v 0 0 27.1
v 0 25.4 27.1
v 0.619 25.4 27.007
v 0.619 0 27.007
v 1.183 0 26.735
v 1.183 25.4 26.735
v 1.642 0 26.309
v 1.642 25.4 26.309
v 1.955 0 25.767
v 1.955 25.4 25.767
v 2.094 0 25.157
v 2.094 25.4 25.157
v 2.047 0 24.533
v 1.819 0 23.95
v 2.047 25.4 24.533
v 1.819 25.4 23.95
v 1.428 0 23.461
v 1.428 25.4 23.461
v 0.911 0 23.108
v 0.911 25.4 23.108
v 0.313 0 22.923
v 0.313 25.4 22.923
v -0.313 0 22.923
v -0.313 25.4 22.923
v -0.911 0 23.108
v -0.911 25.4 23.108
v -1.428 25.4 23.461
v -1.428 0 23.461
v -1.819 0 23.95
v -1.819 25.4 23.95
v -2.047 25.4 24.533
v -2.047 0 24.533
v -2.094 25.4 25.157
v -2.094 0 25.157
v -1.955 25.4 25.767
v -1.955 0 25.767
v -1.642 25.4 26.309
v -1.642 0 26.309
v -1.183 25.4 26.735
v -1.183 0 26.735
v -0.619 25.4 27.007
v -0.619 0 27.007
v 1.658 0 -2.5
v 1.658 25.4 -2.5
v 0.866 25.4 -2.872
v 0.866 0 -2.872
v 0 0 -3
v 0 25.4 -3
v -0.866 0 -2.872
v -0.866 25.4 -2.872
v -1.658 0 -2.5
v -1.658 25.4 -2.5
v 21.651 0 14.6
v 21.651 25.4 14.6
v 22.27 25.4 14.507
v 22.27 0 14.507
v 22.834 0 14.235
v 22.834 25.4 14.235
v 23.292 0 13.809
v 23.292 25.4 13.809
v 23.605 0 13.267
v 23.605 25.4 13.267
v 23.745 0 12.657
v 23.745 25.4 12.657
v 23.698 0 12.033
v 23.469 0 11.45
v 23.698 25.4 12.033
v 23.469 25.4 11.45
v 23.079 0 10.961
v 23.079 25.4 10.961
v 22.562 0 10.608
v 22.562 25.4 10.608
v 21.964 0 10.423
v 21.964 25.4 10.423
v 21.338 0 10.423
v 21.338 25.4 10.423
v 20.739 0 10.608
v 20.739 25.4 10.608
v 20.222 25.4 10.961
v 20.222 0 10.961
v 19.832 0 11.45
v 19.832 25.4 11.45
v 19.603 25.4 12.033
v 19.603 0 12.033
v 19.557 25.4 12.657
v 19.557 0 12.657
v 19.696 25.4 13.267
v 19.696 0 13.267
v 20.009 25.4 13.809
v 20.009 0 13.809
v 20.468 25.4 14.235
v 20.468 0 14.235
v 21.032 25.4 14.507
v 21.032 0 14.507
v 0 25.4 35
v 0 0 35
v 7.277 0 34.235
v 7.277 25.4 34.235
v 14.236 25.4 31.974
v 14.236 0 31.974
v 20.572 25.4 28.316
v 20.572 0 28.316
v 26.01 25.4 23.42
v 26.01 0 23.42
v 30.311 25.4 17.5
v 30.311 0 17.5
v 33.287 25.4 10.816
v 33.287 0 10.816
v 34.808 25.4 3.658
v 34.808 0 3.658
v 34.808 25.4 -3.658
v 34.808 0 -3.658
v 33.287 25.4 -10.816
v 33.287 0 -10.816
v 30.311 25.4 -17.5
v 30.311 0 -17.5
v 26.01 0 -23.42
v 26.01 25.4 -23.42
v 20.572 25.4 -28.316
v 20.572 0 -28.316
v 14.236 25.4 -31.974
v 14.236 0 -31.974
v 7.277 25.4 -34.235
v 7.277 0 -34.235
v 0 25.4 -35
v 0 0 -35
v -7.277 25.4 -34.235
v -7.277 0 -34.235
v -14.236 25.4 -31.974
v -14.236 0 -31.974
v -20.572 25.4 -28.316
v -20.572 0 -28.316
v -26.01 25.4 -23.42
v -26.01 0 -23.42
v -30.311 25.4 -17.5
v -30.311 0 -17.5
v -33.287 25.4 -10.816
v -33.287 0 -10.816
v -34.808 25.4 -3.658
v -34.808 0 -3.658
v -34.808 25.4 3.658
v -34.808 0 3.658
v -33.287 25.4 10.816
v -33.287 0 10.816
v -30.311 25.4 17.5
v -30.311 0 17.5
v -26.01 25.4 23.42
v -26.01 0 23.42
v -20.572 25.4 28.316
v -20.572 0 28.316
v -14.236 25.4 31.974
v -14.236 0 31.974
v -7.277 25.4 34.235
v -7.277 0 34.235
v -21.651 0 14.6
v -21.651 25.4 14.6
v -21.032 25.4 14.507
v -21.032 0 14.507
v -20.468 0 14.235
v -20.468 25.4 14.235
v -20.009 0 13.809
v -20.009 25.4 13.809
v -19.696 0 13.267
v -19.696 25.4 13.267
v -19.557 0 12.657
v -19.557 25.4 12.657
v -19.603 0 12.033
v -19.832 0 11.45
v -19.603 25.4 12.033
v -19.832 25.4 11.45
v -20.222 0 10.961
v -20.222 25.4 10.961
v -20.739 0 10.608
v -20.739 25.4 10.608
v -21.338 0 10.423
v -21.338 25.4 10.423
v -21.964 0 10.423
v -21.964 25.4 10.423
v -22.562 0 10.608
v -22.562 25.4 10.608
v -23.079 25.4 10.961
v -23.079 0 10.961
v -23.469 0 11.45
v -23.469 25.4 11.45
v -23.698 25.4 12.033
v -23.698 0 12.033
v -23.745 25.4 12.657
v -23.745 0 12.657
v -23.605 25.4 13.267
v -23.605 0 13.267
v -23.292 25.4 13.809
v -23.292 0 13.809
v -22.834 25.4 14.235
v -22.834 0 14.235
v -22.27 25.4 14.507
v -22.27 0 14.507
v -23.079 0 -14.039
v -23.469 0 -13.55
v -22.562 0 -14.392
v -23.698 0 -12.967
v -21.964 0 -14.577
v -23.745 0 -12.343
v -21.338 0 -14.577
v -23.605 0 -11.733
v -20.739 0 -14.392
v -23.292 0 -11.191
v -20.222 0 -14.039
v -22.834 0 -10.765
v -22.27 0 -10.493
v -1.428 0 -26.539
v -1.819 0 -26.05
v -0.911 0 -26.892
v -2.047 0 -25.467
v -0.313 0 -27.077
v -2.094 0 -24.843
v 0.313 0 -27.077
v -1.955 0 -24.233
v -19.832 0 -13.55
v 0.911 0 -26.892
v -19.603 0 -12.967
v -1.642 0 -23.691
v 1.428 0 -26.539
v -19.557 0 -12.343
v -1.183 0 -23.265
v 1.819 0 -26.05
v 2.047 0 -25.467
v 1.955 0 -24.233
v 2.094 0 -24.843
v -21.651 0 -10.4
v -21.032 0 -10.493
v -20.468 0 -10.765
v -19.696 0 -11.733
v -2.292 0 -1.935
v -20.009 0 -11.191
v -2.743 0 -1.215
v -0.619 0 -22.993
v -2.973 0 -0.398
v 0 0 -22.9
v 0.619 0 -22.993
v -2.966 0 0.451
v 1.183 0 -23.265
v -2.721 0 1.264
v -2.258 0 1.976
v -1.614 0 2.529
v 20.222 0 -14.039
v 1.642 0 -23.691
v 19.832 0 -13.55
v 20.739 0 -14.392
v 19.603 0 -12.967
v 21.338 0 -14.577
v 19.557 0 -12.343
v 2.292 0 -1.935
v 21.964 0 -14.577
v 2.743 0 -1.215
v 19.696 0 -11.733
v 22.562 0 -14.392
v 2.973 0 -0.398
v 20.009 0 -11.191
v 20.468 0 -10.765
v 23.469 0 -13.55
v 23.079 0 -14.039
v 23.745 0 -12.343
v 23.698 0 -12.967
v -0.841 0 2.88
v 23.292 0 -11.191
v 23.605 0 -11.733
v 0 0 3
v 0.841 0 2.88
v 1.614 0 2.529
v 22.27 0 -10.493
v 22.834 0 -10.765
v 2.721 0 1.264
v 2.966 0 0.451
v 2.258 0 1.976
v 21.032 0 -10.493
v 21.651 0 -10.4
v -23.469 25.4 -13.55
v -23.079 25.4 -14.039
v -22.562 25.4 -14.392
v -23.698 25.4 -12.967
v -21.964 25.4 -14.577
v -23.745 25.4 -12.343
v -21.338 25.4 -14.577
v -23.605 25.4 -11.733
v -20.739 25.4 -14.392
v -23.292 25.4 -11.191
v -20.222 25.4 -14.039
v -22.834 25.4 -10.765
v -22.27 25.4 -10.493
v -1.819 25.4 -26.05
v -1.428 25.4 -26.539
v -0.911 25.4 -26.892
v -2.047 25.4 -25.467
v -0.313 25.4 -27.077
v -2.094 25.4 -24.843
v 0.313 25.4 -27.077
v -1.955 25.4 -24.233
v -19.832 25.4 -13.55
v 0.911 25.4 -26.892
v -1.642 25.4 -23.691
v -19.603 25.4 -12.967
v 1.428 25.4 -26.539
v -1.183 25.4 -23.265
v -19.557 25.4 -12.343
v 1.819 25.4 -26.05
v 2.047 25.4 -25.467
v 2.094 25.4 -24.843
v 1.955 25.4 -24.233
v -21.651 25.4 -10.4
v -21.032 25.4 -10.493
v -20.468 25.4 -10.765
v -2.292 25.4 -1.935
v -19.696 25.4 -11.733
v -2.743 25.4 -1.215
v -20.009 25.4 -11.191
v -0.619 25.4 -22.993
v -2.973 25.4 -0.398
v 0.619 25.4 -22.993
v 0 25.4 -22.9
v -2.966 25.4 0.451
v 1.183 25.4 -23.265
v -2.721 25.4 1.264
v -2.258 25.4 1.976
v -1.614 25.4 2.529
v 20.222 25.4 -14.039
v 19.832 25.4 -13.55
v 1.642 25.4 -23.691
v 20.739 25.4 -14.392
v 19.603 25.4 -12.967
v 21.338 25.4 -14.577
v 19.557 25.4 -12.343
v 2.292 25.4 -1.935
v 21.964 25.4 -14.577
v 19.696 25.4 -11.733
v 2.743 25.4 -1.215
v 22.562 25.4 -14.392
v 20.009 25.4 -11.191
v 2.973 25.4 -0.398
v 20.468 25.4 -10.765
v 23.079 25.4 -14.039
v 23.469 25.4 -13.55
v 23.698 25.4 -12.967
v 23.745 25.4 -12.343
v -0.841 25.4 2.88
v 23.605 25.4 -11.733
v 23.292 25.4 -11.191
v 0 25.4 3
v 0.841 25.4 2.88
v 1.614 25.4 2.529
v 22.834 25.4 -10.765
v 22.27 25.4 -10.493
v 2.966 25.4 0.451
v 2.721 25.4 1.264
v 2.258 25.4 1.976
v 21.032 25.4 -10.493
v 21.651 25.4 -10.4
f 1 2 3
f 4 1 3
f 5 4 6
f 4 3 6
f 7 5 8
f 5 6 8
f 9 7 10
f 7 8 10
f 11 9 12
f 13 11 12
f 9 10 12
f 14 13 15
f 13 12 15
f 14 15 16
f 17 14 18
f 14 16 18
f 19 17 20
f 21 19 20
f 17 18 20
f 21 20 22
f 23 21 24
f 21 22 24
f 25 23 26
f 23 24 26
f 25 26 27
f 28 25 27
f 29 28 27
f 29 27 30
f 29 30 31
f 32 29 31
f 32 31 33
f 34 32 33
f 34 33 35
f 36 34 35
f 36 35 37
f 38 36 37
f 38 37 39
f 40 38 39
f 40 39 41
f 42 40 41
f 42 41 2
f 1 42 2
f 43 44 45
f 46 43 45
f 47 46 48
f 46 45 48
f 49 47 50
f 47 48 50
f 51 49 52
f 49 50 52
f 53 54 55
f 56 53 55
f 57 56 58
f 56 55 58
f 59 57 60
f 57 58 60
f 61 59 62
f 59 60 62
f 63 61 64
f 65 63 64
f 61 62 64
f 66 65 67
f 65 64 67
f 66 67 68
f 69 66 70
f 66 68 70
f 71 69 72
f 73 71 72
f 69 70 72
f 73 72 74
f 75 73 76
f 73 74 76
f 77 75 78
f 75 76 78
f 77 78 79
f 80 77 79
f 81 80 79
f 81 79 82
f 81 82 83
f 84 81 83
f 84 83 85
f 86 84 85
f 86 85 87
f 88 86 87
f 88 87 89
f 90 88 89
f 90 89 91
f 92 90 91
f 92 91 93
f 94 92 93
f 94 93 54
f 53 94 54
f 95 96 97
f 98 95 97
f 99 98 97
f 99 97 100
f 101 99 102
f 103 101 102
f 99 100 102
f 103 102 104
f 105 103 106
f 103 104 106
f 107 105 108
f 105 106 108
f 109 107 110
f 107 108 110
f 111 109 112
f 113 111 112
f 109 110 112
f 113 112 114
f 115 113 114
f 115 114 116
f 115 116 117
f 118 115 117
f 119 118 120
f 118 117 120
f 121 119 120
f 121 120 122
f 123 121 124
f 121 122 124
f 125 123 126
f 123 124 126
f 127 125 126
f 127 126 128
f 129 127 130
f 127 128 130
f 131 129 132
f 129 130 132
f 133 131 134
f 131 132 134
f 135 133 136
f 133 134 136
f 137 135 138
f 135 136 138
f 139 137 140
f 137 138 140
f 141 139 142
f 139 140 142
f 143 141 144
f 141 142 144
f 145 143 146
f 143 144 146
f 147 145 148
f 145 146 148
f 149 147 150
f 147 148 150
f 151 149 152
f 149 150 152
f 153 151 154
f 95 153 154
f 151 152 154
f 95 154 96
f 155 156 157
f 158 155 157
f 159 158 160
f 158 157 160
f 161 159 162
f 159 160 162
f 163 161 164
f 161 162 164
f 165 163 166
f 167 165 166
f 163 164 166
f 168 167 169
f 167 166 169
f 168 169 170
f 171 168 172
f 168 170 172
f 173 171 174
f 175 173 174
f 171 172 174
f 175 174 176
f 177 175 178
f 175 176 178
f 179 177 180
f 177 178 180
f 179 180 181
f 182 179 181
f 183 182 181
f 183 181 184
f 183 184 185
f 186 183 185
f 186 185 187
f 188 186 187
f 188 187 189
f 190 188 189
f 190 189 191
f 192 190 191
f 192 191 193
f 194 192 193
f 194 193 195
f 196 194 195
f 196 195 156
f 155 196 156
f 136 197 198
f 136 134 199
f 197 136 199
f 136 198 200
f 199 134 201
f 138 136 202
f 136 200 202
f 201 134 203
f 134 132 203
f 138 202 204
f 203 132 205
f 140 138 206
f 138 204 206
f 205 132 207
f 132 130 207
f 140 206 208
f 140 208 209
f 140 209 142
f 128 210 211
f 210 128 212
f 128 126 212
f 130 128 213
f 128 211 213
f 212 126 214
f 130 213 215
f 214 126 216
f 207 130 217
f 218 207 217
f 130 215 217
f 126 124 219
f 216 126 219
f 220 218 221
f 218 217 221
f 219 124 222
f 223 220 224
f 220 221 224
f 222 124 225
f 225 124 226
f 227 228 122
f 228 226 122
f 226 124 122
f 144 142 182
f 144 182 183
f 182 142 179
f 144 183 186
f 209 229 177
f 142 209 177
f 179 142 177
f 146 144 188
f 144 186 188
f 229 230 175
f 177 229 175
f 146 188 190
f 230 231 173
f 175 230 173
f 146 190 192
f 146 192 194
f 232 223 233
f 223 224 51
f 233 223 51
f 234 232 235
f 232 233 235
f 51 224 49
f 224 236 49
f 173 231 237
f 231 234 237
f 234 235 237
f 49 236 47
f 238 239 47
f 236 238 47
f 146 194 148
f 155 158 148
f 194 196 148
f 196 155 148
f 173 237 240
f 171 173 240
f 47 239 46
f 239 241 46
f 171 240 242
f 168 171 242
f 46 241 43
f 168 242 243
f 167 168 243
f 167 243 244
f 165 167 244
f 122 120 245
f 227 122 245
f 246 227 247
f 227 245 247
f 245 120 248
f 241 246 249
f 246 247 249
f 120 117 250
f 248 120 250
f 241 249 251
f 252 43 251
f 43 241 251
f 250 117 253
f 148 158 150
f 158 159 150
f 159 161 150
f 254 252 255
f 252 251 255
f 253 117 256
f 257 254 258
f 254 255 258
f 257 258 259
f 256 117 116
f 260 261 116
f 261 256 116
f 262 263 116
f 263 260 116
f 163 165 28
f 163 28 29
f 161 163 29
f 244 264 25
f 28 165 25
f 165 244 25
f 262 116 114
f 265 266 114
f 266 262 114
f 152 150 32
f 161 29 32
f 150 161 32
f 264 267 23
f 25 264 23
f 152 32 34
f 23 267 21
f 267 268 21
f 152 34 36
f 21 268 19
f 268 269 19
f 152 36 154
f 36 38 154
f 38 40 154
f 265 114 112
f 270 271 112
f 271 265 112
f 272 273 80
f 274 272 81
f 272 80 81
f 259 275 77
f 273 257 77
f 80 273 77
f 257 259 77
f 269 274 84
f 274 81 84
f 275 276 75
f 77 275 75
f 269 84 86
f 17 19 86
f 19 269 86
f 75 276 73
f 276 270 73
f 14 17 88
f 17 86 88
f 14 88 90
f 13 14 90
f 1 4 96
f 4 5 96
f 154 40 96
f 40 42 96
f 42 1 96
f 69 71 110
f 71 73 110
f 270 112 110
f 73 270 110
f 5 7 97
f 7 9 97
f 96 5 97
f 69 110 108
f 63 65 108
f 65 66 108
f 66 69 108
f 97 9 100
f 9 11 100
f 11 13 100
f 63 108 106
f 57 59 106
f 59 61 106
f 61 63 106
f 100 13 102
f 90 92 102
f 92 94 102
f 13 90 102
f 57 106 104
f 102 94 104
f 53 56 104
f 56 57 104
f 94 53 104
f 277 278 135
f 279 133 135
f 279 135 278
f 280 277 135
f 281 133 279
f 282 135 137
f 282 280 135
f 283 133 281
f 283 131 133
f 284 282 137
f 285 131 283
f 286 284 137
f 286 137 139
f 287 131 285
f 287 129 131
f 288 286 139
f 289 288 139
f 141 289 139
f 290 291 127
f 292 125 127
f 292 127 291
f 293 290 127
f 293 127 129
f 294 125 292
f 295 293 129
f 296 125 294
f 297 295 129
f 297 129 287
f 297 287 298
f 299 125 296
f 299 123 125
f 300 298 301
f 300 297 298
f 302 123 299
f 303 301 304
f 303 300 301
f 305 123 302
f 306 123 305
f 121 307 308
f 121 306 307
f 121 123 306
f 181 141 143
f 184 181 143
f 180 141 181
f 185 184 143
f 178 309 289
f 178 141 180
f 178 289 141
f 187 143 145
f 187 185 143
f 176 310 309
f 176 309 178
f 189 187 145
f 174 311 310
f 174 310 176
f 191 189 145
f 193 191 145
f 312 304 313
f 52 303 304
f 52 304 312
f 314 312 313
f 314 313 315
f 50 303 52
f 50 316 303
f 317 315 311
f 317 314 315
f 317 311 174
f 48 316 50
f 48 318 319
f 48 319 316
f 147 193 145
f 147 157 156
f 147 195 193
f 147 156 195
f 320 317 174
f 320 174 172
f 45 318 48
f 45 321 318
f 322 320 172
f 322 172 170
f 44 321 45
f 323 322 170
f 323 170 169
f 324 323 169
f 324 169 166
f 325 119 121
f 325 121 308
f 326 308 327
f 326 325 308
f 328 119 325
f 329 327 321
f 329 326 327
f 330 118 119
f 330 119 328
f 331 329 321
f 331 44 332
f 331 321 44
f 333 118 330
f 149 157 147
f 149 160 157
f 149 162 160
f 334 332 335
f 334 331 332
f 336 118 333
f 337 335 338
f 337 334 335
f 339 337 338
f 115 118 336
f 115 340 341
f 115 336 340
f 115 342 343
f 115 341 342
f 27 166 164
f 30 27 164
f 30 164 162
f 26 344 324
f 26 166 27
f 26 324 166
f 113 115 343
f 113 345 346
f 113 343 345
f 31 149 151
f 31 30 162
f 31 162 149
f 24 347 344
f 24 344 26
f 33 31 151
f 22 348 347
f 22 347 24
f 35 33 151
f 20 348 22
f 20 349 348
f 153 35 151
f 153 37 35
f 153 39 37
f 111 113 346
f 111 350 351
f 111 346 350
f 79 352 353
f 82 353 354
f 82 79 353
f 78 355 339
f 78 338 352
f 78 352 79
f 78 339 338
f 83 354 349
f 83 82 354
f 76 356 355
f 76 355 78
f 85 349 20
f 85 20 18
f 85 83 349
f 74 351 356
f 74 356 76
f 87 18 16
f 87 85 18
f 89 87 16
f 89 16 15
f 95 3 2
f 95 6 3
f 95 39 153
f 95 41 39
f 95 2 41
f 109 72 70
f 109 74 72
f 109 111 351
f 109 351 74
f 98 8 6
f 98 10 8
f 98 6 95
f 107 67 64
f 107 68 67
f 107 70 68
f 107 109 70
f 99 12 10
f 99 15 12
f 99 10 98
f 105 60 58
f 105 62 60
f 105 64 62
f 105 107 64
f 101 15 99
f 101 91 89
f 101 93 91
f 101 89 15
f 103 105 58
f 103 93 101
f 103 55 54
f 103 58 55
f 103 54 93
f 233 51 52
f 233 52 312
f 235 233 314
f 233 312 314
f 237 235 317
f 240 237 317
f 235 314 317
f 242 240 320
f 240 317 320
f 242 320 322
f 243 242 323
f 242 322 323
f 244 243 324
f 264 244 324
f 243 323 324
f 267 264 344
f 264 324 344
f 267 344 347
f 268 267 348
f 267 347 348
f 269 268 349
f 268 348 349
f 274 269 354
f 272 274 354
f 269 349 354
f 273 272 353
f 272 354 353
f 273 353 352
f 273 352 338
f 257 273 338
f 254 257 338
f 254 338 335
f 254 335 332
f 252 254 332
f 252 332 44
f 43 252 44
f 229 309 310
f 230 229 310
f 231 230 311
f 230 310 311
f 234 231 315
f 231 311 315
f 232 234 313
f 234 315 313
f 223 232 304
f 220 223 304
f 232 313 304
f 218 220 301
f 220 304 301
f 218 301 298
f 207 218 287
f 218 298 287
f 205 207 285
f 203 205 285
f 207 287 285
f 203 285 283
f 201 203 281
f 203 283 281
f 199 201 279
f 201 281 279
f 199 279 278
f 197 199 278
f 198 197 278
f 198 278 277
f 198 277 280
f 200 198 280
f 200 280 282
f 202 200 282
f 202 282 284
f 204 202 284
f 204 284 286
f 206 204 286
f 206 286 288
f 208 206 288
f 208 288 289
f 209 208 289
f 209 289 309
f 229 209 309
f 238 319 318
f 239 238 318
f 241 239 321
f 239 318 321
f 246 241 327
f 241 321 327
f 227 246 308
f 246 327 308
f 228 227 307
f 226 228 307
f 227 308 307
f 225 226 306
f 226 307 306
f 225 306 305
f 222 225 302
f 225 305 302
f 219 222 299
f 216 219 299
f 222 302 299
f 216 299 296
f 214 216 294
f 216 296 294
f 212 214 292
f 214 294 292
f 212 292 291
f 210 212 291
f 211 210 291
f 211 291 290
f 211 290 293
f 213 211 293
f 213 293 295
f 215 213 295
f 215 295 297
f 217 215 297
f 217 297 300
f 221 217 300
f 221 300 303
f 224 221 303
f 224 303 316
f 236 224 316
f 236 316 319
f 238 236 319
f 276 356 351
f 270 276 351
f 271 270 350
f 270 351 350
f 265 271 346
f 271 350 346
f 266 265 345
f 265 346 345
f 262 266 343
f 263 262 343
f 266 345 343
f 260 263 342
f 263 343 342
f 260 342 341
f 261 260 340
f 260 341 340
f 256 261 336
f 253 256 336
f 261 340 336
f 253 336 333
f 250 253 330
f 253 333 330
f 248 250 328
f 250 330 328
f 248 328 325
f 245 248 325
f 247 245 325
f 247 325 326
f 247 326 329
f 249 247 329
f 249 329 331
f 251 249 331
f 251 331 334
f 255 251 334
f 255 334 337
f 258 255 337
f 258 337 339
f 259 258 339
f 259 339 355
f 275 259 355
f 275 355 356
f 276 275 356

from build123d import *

# Parameters (mm, degrees)
SKETCH2_R           = 35
BOSS_EXTRUDE1_DEPTH = 25.4
CUT_EXTRUDE1_DEPTH  = 56.634162167
SKETCH5_R           = 2.1
CUT_EXTRUDE3_DEPTH  = 56.634162167


with BuildPart() as part:
    # Sketch2 → Boss-Extrude1 (new body)
    with BuildSketch(Plane(origin=(0, 0, 0), x_dir=(1, 0, 0), z_dir=(0, 1, 0))):
        with Locations(Location((0, 0, 0), (0, 0, 270))):
            Circle(SKETCH2_R)
    extrude(amount=BOSS_EXTRUDE1_DEPTH)

    # Sketch3 → Cut-Extrude1 (cut, through all)
    with BuildSketch(Plane(origin=(0, 25.4, 0), x_dir=(1, 0, 0), z_dir=(0, 1, 0))):
        with BuildLine():
            ThreePointArc((-1.658312395, 2.5), (0, -3), (1.658312395, 2.5))
            ThreePointArc((1.658312395, 2.5), (0, 3), (-1.658312395, 2.5))
        make_face()
    extrude(amount=-CUT_EXTRUDE1_DEPTH, mode=Mode.SUBTRACT)

    # Sketch5 → Cut-Extrude3 (cut, through all)
    with BuildSketch(Plane(origin=(0, 25.4, 0), x_dir=(1, 0, 0), z_dir=(0, 1, 0))):
        with Locations(Location((0, 25, 0), (0, 0, 270))):
            Circle(SKETCH5_R)
        with Locations(Location((21.650635095, 12.5, 0), (0, 0, 270))):
            Circle(SKETCH5_R)
        with Locations(Location((21.650635095, -12.5, 0), (0, 0, 270))):
            Circle(SKETCH5_R)
        with Locations(Location((0, -25, 0), (0, 0, 270))):
            Circle(SKETCH5_R)
        with Locations(Location((-21.650635095, -12.5, 0), (0, 0, 270))):
            Circle(SKETCH5_R)
        with Locations(Location((-21.650635095, 12.5, 0), (0, 0, 270))):
            Circle(SKETCH5_R)
    extrude(amount=-CUT_EXTRUDE3_DEPTH, mode=Mode.SUBTRACT)


solid = part.part
